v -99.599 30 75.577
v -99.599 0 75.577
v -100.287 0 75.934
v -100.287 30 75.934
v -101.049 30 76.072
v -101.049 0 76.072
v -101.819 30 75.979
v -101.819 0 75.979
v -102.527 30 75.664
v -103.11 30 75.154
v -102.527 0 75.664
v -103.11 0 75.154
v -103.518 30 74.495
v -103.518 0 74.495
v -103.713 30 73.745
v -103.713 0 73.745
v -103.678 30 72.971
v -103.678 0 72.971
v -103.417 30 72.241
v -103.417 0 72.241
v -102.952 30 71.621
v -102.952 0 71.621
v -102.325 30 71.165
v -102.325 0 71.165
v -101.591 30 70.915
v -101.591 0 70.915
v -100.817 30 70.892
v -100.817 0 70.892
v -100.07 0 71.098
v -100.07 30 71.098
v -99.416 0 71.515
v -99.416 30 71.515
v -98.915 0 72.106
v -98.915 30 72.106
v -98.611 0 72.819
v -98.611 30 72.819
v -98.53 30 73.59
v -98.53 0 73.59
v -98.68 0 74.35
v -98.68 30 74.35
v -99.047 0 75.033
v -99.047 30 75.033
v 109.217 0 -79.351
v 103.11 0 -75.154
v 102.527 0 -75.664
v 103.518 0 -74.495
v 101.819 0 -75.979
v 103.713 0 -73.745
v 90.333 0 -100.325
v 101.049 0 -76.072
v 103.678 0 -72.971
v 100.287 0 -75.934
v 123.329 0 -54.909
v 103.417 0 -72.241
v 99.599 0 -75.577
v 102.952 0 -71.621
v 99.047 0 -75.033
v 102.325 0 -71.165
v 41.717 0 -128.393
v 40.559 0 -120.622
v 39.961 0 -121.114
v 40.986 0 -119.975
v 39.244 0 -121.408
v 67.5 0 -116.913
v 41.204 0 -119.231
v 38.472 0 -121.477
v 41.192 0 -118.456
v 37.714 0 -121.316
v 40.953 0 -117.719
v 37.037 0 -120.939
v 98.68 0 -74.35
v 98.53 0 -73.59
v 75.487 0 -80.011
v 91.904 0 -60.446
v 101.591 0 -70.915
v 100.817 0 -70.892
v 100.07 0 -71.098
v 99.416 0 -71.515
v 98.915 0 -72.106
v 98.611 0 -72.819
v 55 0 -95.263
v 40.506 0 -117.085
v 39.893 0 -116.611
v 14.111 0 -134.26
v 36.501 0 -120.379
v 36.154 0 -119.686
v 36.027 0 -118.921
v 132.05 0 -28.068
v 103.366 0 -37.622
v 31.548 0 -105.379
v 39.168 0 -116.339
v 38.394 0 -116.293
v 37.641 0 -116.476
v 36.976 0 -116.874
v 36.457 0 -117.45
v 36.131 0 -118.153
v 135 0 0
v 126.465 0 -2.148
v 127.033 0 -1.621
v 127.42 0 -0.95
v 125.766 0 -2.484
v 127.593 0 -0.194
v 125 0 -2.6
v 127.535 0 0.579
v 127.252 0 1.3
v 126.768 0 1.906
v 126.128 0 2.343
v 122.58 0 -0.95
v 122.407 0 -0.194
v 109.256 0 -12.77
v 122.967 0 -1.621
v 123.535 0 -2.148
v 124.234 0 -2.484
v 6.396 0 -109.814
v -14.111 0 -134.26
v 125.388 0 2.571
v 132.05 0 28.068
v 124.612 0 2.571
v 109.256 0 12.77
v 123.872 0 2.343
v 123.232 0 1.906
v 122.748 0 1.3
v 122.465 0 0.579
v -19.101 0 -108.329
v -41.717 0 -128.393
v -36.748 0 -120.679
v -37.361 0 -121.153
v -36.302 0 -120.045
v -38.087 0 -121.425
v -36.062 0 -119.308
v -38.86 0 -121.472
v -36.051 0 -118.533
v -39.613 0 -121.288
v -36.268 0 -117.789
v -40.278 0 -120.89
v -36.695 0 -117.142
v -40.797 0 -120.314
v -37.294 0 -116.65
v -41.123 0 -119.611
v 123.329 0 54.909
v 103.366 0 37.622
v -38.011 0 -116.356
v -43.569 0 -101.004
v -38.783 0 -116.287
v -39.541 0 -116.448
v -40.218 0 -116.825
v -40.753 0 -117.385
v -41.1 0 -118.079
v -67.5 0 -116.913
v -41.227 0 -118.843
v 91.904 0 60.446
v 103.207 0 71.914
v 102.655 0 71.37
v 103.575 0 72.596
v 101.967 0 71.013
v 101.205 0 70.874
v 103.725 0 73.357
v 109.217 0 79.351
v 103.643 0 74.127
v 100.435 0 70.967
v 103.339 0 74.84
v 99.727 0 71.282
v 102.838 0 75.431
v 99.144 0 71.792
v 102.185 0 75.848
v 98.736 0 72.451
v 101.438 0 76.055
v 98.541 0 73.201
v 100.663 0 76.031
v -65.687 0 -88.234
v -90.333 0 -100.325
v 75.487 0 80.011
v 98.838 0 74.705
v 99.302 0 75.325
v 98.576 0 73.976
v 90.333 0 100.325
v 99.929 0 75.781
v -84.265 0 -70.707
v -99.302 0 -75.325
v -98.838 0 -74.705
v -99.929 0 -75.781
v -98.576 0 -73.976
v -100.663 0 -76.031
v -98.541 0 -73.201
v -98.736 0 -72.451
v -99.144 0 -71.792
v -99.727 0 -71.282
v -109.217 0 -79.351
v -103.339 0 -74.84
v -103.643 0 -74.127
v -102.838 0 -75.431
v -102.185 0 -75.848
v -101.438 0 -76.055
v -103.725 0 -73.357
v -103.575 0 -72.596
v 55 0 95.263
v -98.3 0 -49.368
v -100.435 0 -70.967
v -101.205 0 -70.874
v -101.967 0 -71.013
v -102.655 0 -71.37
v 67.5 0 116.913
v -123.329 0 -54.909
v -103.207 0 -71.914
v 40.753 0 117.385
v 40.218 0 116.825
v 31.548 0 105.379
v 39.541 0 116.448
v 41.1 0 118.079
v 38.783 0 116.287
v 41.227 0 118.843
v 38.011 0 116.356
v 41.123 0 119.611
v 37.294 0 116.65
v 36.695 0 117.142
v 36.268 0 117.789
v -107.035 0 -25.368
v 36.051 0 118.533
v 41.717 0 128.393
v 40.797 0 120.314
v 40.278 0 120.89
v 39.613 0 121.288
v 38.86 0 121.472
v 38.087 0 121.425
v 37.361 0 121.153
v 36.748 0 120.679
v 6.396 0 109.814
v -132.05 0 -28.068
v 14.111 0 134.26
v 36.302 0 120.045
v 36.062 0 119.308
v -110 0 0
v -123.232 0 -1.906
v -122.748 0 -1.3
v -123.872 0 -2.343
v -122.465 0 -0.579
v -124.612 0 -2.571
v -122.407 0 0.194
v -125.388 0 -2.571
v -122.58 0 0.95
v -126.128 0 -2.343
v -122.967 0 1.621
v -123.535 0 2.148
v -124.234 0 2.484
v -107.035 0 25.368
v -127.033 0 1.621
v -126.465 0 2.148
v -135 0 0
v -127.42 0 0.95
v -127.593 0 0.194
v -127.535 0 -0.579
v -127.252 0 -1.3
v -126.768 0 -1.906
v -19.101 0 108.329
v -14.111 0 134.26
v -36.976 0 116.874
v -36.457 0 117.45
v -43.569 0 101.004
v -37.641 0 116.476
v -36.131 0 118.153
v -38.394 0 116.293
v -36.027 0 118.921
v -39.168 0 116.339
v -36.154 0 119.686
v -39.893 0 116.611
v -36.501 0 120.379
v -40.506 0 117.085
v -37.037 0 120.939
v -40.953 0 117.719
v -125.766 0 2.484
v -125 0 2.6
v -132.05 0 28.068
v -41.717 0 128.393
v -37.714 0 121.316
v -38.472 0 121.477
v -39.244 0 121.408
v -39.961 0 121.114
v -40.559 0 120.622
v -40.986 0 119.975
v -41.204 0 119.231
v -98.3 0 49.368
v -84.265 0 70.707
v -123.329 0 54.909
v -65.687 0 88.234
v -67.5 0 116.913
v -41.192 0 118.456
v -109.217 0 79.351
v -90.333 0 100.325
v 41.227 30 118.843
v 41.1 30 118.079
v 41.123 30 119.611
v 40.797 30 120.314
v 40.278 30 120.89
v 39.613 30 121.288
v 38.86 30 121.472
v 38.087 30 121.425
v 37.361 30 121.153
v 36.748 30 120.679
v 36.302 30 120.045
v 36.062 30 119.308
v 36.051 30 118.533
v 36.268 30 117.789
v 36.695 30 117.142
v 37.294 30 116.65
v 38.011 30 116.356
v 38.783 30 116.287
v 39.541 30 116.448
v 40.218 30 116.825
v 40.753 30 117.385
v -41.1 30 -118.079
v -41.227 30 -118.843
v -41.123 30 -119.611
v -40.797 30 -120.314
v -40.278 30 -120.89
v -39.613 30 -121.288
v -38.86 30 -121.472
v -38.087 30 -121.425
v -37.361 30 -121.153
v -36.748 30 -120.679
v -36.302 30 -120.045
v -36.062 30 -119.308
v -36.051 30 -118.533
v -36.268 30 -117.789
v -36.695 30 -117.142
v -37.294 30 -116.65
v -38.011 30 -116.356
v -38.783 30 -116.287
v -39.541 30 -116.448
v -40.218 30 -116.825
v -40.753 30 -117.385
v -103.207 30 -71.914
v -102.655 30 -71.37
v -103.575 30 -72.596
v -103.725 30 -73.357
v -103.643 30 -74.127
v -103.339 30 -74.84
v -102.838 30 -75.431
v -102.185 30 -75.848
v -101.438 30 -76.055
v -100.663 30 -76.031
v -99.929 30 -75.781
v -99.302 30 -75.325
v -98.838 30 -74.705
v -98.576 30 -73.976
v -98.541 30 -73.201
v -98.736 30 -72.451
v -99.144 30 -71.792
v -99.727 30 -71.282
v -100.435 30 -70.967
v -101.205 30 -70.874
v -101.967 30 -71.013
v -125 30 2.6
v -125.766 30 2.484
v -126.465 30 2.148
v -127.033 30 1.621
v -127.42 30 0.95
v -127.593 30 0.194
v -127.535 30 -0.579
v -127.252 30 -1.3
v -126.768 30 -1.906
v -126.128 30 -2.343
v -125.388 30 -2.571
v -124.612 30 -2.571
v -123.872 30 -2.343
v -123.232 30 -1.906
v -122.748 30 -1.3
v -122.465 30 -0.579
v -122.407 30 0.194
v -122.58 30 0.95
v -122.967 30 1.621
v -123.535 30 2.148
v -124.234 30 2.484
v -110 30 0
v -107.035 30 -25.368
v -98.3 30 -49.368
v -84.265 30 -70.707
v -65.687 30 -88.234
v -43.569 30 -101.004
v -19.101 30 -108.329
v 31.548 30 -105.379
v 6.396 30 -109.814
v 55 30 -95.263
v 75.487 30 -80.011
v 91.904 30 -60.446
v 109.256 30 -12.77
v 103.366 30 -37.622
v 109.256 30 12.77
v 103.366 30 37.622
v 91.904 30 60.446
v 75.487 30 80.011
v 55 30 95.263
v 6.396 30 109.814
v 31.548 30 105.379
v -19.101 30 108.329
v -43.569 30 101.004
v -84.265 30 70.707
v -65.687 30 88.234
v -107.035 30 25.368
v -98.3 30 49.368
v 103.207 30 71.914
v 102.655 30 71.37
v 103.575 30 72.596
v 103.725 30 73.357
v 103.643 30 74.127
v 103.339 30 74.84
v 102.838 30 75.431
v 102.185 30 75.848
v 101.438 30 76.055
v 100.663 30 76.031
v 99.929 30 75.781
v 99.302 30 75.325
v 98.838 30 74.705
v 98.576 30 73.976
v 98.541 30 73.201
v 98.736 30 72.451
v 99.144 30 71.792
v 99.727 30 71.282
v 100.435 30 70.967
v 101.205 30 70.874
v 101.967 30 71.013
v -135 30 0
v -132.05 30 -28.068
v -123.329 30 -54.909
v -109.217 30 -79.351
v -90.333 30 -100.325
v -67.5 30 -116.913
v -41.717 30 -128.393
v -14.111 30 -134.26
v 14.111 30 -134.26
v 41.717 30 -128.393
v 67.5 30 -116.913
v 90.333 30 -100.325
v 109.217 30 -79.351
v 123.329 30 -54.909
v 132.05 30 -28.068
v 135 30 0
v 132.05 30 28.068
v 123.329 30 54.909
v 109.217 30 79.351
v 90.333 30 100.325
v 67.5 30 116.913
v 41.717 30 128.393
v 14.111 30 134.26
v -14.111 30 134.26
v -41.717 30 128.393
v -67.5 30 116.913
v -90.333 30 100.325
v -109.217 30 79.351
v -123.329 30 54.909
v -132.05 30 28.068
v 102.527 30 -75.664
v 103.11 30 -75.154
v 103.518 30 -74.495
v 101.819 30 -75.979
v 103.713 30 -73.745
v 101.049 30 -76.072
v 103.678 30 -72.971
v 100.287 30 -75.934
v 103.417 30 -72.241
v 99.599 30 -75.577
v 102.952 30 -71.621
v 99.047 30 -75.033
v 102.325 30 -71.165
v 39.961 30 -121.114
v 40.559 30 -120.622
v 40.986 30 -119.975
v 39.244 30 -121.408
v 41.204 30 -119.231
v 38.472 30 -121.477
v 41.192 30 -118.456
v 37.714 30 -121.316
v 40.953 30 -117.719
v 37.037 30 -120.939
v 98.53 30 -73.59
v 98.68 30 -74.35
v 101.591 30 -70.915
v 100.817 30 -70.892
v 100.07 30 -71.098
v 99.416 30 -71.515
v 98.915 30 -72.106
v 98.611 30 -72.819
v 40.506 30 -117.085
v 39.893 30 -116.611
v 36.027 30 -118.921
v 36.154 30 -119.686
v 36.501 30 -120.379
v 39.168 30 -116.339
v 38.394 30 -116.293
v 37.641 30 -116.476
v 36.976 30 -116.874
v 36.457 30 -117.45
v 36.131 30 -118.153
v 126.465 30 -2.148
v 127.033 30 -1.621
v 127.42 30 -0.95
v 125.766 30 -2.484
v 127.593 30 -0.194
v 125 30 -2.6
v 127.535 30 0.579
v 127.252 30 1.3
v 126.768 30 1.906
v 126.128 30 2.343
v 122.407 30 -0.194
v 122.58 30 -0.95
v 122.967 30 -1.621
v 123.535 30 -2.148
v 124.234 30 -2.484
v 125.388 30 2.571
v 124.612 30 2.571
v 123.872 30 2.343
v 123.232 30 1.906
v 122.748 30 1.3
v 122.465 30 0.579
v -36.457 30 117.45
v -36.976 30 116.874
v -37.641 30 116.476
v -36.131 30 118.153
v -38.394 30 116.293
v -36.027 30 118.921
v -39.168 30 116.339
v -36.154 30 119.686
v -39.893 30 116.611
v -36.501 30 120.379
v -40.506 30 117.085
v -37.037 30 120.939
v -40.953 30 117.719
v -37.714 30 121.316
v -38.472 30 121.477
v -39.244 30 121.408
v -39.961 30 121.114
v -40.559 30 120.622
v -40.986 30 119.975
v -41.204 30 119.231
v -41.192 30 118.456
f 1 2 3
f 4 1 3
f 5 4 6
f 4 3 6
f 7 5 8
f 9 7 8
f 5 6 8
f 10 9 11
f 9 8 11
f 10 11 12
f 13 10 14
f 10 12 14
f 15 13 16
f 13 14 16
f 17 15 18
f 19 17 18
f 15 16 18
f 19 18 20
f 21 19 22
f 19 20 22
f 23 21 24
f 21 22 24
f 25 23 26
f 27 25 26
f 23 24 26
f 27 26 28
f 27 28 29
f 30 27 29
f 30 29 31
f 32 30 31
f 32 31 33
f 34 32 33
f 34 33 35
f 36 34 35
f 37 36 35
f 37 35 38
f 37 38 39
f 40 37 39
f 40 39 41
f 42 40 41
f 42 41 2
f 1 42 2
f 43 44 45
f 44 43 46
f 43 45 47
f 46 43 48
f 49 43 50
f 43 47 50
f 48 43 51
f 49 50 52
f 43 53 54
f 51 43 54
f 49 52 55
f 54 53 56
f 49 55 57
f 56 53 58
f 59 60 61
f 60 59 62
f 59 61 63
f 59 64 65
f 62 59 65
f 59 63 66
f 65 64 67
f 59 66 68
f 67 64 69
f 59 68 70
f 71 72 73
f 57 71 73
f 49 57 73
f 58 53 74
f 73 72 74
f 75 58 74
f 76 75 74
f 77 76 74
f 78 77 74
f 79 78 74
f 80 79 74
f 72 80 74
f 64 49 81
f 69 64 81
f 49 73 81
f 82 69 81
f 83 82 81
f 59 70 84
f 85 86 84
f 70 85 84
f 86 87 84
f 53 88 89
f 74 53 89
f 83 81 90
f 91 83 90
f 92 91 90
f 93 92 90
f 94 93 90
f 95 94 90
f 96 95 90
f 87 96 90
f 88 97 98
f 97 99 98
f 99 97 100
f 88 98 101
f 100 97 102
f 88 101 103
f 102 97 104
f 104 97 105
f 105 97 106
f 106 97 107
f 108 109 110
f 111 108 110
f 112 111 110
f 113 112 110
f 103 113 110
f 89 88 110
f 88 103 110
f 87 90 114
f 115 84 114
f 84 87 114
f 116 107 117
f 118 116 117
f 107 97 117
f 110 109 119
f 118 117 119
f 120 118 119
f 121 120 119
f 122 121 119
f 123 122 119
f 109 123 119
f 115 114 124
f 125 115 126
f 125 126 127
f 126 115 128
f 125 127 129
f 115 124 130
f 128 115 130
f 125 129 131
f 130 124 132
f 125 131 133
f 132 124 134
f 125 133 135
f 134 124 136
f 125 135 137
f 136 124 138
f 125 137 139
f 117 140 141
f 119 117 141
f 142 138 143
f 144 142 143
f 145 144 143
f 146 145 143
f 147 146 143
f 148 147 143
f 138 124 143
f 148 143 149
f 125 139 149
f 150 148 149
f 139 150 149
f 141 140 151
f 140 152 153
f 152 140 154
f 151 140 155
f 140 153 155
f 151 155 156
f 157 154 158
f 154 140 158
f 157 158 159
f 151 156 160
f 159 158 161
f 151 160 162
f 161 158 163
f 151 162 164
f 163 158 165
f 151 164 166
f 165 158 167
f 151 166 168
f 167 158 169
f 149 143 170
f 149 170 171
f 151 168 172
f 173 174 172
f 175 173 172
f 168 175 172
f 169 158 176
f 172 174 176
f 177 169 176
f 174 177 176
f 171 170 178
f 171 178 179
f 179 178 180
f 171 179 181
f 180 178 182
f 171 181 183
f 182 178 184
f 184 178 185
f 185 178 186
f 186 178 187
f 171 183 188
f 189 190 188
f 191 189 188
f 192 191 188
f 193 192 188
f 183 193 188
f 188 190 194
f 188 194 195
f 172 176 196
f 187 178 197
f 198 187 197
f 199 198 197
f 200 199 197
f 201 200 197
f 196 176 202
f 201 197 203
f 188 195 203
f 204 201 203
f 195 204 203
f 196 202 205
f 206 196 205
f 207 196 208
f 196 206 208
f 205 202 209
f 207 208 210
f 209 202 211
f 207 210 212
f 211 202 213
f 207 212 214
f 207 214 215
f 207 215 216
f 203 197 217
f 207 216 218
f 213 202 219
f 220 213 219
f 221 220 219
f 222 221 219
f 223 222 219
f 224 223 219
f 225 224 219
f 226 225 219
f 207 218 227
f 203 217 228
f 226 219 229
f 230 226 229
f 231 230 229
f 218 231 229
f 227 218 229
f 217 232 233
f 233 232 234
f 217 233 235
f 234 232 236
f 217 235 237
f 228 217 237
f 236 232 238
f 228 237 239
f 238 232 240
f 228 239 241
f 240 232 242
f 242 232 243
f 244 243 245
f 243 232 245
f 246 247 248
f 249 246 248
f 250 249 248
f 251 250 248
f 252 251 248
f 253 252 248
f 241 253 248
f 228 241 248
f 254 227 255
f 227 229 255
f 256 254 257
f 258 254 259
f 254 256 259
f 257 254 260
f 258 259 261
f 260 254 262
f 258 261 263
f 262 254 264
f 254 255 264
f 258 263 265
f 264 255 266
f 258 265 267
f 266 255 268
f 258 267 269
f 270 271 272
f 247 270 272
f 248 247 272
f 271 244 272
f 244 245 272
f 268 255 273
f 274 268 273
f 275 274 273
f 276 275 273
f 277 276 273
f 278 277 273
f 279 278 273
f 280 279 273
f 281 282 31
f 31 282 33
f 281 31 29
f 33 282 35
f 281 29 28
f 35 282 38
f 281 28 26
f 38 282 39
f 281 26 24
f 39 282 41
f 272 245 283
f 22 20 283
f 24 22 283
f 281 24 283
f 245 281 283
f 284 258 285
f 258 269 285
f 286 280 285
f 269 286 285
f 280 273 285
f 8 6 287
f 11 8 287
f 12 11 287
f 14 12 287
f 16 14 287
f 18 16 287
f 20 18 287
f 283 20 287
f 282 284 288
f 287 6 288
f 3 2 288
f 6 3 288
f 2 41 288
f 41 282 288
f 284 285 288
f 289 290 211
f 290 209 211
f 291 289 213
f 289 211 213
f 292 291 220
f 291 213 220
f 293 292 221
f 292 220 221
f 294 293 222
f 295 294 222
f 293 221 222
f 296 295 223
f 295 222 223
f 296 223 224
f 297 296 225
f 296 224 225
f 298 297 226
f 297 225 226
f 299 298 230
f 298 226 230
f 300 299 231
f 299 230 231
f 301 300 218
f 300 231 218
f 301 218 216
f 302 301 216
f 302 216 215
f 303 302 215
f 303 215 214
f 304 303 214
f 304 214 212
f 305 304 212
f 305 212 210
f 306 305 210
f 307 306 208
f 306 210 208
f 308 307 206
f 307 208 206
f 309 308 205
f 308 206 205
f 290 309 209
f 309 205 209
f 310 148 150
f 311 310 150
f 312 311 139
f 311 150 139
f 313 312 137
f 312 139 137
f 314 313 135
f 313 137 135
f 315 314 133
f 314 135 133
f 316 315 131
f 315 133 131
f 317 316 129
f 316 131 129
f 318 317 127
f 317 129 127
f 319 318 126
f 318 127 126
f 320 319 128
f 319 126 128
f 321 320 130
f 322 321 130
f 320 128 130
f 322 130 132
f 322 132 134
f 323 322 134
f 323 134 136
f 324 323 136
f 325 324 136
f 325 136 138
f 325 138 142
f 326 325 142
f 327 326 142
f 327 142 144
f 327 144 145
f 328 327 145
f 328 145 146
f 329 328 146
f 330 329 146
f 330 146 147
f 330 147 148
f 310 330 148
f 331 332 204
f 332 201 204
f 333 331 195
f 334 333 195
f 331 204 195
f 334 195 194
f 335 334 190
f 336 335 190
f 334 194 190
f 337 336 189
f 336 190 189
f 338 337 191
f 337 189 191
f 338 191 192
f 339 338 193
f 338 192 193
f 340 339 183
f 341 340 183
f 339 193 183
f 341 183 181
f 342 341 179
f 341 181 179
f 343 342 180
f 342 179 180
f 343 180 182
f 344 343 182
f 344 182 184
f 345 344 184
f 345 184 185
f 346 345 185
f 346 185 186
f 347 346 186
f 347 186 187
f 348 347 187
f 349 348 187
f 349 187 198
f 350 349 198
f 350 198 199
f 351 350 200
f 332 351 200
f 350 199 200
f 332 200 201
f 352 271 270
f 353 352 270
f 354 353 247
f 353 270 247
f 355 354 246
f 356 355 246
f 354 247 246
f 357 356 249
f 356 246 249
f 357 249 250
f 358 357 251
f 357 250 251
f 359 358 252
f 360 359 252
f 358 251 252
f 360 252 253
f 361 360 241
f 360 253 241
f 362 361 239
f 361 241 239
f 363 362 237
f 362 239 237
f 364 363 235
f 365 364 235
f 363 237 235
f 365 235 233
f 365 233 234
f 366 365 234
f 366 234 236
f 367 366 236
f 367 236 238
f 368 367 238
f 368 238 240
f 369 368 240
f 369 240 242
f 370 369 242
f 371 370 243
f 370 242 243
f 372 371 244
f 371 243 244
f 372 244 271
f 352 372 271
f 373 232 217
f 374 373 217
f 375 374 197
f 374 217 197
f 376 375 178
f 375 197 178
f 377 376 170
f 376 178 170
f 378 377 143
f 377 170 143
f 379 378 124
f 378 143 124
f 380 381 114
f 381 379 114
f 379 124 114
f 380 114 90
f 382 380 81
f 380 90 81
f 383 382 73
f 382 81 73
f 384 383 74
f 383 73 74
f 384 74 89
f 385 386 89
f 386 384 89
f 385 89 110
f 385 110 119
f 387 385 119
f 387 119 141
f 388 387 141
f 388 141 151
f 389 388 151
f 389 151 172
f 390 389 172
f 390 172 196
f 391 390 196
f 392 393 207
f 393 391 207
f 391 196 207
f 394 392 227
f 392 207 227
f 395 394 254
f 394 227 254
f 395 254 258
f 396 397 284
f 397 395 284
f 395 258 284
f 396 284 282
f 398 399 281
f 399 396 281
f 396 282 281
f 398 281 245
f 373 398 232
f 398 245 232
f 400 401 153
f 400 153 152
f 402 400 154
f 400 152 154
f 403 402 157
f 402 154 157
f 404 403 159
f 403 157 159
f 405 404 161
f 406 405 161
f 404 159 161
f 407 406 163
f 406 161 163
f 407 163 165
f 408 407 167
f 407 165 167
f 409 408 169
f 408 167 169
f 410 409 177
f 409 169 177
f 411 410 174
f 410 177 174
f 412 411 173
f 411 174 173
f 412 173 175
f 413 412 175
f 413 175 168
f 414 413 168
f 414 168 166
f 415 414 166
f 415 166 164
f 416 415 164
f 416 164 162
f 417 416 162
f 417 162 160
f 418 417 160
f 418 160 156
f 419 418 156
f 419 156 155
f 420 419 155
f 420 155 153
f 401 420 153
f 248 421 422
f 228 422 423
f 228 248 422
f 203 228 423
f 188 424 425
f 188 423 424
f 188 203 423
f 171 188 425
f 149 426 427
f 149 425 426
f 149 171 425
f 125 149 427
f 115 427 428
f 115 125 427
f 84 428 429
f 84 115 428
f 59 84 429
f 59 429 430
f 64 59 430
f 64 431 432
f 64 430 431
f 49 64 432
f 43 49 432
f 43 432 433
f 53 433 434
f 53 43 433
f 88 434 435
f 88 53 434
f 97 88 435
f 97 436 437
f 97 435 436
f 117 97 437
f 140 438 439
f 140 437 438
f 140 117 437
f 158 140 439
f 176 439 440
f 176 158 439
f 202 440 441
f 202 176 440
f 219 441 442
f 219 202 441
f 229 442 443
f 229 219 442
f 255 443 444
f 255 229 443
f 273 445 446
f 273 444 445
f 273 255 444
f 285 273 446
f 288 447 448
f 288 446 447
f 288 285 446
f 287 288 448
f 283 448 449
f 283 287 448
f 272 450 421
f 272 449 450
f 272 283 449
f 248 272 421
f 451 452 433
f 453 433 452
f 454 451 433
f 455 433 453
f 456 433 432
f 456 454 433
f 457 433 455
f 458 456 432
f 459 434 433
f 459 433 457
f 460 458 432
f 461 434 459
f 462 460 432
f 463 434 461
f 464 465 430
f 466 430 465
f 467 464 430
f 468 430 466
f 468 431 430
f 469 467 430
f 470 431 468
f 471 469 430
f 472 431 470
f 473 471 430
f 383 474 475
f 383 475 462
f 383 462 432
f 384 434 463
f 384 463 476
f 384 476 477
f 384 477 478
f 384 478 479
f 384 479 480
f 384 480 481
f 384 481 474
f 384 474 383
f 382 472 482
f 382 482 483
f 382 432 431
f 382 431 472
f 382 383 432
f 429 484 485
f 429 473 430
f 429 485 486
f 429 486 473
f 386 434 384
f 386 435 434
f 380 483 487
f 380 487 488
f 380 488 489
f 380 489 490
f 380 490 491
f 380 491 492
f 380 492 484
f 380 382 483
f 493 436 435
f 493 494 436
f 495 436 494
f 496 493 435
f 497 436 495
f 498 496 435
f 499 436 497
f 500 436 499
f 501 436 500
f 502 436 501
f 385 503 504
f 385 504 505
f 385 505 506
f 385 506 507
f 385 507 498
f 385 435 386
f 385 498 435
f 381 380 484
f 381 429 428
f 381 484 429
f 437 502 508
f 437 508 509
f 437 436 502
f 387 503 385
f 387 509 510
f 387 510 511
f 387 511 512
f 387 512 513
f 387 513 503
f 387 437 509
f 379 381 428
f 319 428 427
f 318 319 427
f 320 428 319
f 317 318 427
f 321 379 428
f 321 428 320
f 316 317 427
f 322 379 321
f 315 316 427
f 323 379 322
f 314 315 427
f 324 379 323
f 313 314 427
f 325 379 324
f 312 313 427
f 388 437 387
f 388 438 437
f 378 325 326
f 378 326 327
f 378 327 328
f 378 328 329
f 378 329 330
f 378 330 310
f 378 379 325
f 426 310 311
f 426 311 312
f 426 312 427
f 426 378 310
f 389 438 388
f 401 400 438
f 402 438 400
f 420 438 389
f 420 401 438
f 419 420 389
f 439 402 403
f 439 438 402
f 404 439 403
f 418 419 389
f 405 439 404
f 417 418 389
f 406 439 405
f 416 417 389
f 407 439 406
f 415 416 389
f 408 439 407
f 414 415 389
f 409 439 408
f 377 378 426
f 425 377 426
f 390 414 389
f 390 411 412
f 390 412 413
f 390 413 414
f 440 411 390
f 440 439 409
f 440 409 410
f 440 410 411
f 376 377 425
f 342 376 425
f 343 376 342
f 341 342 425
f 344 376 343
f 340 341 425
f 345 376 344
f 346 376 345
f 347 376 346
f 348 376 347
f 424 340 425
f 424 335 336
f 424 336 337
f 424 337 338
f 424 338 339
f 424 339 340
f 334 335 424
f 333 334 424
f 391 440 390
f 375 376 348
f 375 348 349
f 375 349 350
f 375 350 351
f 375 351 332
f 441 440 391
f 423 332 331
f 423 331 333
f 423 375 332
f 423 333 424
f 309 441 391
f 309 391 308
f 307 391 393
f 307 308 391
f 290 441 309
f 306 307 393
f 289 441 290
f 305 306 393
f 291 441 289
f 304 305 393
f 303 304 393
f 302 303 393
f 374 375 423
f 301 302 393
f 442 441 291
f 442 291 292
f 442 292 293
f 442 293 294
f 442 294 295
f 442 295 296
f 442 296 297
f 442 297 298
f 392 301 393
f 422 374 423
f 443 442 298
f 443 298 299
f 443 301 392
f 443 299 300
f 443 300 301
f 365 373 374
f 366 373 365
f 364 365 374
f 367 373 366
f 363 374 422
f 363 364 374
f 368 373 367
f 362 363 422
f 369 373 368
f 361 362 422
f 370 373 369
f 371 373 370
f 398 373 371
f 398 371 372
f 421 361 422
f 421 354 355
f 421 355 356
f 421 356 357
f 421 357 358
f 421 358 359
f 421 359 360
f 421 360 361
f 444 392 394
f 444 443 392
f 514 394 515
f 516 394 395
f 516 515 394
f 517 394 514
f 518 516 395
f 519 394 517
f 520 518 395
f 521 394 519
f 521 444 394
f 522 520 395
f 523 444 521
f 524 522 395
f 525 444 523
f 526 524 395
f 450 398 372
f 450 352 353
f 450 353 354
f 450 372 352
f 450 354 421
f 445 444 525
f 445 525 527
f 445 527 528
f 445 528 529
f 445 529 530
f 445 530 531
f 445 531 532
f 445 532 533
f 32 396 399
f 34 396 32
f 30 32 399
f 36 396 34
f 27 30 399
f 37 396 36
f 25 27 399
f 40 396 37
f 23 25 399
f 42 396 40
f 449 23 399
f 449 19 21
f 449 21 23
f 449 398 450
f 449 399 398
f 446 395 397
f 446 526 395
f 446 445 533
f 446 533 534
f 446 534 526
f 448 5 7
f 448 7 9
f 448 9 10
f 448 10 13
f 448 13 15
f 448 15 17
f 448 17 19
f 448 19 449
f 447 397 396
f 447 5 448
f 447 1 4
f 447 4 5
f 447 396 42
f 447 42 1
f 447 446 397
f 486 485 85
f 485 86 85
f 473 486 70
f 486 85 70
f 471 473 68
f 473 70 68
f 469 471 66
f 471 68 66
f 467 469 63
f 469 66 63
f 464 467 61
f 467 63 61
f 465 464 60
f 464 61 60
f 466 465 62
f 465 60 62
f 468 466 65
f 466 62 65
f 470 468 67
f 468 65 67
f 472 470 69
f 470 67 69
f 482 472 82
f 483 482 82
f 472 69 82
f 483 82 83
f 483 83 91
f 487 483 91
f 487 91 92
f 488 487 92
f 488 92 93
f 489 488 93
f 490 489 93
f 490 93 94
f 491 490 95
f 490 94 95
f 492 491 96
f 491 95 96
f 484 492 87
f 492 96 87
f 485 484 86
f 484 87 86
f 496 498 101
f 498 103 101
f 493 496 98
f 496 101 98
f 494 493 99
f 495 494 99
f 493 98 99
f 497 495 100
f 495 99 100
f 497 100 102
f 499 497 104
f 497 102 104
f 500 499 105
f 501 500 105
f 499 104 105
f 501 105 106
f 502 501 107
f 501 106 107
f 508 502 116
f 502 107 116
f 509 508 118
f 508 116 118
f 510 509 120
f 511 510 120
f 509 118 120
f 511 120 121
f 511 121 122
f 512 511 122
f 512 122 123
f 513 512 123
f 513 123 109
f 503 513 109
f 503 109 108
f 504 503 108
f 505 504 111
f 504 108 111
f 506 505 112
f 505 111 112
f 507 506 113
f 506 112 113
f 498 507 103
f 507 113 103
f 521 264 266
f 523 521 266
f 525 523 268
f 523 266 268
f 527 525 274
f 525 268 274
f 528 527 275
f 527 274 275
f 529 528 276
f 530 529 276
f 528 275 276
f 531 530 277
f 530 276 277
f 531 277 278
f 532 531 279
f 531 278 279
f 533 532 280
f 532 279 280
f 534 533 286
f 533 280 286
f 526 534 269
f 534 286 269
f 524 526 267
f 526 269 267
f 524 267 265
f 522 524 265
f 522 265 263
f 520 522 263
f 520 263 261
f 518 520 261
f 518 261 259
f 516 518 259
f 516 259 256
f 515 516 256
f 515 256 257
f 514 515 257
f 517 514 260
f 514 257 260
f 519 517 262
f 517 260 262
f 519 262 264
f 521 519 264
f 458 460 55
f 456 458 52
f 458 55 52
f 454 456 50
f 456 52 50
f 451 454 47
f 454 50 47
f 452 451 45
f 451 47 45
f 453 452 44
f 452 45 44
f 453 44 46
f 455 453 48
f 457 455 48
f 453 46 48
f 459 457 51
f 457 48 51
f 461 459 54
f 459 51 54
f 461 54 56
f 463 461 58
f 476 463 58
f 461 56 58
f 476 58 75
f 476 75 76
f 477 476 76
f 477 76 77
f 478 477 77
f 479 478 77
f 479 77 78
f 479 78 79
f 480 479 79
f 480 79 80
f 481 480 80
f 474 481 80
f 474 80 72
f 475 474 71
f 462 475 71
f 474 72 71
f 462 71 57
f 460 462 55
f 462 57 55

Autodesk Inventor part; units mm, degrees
ref_plane "YZ Plane" through (0, 0, 0) normal (1, 0, 0) x (0, 1, 0)
ref_plane "XZ Plane" through (0, 0, 0) normal (0, 1, 0) x (-1, 0, 0)
ref_plane "XY Plane" through (0, 0, 0) normal (0, 0, 1) x (1, 0, 0)
sketch "Sketch1" plane through (0, 0, 0) normal (0, 1, 0) x (-1, 0, 0)
  circle A0 centre (0, 0) radius 135
  circle A1 centre (0, 0) radius 110
  dimension "d0" = 270
  dimension "d1" = 220
extrude "Extrusion1" add sketch "Sketch1" along normal blind 30
sketch "Sketch2" plane through (0, 30, 0) normal (0, 1, 0) x (1, 0, 0)
  line L0 (-189, 0) -> (189, 0) projected
  point P0 (0, 0)
  point P1 (-125, 0)
  dimension "d11" = 125
hole "Hole1" at (-125, 30, 0) direction (0, -1, 0) diameter 5.2 end through all
pattern_circular "Circular Pattern1" count 10 over 360 about axis through (0, -10, 0) along (0, 1, 0) of "Hole1"
properties part number "Lower Ring (30mm)"
